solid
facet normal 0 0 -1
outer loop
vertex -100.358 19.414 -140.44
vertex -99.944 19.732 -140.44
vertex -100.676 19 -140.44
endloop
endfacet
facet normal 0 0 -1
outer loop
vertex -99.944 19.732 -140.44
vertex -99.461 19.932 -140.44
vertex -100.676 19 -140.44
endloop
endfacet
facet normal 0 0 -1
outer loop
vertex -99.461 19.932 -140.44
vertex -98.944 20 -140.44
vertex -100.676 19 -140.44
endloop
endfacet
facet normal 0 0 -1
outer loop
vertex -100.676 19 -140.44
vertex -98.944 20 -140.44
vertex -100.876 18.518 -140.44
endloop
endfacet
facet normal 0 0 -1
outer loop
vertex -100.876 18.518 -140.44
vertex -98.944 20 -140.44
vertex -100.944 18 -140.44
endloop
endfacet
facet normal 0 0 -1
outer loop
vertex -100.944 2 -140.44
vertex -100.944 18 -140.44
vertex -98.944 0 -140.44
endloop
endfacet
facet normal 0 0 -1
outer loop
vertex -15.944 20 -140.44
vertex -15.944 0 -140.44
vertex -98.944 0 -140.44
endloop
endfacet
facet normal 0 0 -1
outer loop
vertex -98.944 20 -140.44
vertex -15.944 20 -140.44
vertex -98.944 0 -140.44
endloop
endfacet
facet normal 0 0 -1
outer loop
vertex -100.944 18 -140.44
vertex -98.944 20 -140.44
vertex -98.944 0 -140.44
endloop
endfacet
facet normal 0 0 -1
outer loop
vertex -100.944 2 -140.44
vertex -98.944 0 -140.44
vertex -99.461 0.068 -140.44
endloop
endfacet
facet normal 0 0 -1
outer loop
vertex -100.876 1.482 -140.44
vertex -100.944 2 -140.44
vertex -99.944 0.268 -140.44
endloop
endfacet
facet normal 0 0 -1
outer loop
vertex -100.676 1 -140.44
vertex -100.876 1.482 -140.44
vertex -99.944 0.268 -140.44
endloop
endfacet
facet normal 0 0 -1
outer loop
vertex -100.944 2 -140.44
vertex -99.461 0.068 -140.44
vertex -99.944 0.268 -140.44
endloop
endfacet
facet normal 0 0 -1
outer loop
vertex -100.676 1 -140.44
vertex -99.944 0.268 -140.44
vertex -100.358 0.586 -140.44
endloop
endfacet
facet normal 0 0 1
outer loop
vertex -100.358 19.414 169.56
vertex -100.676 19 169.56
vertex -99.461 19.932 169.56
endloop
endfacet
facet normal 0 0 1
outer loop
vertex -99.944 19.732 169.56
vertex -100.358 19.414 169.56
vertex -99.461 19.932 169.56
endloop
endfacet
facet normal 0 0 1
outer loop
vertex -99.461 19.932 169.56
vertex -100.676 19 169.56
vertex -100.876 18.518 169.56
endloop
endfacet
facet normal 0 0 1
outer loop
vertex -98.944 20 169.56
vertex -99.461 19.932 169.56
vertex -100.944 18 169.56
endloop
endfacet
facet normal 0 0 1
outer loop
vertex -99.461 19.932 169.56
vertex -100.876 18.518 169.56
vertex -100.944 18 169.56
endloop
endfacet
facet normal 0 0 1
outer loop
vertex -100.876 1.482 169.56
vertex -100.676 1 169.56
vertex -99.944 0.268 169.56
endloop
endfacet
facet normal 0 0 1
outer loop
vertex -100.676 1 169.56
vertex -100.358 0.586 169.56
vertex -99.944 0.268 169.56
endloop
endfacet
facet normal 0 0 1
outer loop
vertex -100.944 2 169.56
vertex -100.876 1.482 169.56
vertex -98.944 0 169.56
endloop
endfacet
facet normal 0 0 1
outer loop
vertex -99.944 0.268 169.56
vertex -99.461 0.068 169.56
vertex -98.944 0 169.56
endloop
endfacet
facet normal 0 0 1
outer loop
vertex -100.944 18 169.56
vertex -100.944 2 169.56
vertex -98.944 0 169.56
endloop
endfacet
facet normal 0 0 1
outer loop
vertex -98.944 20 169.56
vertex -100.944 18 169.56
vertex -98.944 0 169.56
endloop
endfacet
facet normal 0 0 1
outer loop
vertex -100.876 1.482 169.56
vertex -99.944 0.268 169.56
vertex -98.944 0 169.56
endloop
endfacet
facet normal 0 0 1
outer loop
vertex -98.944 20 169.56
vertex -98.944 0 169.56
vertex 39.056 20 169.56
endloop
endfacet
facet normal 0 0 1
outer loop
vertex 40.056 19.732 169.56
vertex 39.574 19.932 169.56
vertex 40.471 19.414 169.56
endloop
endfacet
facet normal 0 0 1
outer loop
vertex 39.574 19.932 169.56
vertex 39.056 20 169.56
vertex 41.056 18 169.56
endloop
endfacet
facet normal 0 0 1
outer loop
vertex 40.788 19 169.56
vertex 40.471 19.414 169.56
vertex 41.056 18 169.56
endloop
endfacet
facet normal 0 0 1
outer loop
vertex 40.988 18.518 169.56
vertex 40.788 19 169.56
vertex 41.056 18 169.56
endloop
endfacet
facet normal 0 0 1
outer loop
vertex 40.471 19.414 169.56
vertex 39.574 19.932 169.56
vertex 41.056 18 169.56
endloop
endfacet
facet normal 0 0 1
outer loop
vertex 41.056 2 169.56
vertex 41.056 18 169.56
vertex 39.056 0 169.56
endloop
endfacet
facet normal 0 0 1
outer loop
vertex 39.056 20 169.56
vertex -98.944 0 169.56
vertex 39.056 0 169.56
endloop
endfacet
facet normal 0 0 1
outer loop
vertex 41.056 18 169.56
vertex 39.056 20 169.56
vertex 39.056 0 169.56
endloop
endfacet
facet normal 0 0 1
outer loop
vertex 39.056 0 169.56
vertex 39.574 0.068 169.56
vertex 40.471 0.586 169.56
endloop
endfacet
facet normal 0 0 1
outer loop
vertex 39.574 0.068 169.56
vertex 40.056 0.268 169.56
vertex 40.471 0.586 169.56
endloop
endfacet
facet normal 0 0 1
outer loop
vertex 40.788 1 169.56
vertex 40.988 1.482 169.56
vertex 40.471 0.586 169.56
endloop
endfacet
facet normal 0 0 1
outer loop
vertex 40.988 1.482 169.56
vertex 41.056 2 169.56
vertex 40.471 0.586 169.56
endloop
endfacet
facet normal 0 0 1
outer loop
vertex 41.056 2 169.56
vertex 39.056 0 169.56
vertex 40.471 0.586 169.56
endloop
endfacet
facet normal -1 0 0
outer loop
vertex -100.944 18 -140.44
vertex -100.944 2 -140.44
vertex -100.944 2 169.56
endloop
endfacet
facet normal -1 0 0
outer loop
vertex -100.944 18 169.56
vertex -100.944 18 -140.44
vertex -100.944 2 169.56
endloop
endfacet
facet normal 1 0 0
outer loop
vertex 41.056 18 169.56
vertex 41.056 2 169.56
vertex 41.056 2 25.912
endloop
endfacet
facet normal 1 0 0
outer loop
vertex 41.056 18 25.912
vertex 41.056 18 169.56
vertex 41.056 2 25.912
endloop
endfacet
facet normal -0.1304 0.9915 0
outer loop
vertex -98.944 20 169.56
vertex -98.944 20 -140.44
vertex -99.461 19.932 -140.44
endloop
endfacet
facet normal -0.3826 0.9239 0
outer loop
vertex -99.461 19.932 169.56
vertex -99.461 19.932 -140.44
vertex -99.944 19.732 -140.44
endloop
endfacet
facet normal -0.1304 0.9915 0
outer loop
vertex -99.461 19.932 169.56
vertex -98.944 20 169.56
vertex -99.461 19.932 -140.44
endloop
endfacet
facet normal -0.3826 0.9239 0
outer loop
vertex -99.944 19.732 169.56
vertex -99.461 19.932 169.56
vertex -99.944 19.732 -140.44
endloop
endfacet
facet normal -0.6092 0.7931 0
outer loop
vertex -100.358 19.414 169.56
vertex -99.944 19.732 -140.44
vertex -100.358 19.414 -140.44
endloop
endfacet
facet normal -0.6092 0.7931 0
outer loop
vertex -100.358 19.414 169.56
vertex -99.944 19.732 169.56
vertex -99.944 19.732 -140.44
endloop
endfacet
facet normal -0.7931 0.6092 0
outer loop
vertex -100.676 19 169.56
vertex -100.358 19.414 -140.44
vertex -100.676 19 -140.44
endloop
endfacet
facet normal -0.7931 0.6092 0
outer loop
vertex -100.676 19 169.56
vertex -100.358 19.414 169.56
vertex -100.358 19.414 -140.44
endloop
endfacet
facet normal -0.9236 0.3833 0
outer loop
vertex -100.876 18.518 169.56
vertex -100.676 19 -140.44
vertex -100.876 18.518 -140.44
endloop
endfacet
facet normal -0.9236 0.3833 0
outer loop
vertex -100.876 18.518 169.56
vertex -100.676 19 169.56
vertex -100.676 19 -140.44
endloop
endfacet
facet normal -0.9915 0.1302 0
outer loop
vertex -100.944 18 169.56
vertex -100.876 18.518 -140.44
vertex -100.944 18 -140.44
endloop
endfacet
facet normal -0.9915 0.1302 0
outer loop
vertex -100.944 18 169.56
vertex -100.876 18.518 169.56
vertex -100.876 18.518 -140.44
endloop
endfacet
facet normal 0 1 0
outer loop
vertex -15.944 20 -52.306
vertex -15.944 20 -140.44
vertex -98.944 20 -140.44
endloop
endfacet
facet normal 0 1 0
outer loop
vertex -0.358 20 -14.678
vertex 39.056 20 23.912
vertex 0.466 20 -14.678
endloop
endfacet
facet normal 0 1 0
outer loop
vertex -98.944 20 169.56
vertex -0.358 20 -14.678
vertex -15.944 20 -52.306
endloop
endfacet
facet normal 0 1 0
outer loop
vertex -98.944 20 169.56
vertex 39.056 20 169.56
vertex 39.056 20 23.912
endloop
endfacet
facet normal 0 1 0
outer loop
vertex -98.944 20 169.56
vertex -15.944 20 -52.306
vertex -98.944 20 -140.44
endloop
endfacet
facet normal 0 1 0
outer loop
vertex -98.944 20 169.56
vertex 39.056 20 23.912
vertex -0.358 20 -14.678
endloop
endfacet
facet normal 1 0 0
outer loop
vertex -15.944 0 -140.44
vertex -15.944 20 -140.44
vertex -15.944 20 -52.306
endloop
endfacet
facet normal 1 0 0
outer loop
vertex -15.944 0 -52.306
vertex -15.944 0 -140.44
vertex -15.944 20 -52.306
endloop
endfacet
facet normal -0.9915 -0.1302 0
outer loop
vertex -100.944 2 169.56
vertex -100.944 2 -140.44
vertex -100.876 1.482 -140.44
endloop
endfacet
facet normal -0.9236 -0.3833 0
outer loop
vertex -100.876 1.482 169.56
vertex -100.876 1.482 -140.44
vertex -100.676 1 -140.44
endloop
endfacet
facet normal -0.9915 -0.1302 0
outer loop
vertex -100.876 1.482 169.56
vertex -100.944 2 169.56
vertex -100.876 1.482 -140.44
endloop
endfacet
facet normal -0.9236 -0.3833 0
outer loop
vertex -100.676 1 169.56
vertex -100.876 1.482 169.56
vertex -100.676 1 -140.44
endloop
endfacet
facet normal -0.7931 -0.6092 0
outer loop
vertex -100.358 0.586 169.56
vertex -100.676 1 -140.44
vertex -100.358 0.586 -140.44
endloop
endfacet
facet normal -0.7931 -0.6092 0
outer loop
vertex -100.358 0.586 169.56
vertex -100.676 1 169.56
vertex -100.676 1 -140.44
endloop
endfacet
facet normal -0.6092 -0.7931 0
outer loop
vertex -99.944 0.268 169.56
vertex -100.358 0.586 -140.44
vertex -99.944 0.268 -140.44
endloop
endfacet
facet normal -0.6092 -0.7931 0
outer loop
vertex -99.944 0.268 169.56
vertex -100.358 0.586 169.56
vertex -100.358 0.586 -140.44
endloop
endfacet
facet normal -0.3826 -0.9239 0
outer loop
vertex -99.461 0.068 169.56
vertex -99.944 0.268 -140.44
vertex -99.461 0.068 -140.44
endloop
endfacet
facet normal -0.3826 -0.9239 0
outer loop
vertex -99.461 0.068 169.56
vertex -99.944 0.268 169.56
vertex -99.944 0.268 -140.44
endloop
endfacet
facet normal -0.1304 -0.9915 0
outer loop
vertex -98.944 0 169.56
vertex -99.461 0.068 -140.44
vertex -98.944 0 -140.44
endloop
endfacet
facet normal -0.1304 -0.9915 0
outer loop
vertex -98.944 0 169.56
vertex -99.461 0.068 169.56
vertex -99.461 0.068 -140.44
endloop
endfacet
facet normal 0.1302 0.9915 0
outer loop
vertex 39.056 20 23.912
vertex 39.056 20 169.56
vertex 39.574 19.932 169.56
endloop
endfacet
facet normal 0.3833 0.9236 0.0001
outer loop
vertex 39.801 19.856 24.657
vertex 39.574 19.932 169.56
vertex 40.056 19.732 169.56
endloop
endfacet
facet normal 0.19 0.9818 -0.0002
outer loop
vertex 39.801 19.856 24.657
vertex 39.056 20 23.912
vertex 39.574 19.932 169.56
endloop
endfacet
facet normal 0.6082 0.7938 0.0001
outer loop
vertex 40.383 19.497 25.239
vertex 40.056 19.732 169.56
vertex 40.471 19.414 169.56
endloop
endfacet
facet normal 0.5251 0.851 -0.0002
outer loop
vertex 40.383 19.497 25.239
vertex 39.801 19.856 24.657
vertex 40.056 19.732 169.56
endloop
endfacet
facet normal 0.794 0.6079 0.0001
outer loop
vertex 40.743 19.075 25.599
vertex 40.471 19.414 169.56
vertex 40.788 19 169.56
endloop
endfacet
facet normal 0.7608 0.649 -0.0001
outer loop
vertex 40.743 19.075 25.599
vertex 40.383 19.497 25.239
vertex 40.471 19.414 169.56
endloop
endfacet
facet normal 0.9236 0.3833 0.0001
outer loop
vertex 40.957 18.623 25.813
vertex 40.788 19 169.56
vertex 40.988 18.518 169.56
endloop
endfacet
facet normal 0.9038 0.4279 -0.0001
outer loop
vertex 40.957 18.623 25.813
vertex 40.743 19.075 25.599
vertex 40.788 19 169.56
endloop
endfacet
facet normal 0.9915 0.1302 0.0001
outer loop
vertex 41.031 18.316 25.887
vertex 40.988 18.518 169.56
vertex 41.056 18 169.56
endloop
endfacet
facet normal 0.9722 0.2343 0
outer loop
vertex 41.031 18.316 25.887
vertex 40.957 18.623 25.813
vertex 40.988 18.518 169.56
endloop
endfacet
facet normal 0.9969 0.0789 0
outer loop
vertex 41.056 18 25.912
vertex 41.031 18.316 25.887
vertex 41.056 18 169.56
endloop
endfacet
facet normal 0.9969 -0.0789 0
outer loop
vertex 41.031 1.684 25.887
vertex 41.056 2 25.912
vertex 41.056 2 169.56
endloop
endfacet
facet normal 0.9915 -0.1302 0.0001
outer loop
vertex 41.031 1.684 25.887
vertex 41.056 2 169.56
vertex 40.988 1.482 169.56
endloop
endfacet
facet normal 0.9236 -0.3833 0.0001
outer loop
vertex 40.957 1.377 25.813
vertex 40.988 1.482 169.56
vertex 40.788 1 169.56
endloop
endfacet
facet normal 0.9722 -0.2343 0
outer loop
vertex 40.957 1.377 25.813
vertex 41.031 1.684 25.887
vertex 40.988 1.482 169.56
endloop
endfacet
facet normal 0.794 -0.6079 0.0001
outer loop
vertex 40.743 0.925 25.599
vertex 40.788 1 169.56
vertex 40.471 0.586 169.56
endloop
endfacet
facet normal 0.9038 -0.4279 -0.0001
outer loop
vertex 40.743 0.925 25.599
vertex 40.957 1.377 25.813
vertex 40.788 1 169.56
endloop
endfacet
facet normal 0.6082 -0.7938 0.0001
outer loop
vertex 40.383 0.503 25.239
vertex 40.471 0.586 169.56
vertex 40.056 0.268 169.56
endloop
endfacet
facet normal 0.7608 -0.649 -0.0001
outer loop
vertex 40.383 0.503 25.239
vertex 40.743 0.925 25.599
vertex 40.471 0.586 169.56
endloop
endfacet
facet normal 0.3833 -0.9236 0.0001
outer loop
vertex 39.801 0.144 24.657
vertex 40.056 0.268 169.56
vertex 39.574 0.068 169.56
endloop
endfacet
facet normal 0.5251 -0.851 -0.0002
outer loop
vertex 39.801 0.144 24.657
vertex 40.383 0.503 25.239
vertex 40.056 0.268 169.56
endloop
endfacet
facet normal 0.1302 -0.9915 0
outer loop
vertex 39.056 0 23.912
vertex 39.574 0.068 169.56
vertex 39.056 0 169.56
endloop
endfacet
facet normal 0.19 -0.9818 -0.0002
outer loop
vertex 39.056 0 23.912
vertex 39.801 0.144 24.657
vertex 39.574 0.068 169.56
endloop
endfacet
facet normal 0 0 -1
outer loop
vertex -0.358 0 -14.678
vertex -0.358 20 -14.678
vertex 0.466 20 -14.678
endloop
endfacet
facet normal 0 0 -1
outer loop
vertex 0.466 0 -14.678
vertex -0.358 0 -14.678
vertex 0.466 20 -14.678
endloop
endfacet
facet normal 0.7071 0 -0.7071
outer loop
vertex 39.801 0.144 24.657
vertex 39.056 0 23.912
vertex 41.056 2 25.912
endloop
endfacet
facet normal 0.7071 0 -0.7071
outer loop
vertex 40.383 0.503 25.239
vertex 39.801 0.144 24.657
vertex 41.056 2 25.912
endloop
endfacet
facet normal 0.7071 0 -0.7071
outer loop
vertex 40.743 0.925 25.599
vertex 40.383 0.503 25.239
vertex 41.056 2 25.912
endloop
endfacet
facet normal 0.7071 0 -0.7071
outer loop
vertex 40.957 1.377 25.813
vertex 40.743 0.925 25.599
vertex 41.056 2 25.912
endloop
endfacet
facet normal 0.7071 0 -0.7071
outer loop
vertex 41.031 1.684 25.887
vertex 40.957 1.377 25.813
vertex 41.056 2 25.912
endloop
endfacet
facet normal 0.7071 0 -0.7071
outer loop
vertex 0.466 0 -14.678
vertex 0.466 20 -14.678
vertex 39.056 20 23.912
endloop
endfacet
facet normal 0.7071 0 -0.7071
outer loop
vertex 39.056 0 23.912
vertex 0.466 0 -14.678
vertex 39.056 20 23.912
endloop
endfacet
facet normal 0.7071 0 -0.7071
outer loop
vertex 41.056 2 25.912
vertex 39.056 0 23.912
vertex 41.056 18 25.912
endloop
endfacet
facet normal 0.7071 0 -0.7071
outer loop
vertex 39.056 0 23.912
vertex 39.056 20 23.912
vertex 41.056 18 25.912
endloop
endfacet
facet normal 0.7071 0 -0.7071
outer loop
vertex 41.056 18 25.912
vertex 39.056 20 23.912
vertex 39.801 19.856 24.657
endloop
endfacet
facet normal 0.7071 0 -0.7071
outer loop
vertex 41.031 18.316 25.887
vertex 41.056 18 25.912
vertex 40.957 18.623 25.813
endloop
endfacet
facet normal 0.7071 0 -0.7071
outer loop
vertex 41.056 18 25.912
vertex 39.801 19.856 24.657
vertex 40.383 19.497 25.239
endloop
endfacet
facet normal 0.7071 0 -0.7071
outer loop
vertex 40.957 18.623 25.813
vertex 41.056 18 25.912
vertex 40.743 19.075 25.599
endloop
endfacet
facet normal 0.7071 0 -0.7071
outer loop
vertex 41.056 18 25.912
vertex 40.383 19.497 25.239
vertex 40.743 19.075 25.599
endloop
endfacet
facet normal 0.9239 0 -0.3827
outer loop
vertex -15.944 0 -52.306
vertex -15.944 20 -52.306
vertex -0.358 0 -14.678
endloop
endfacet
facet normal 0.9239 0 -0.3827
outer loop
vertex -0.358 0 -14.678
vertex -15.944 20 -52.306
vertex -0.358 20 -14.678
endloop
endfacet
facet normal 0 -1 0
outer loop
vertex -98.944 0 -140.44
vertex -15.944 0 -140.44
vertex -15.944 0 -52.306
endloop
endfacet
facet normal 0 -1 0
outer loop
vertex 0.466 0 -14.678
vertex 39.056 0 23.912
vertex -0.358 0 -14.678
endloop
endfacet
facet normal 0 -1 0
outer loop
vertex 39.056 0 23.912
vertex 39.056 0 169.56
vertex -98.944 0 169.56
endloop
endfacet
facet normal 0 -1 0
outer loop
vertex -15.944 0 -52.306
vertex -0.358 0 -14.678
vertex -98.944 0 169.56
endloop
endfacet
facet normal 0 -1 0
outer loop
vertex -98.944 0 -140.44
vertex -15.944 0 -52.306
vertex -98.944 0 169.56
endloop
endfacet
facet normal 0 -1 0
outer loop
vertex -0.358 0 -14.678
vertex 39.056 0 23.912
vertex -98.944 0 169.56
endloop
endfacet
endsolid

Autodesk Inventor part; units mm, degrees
ref_plane "YZ Plane" through (0, 0, 0) normal (1, 0, 0) x (0, 1, 0)
ref_plane "XZ Plane" through (0, 0, 0) normal (0, 1, 0) x (-1, 0, 0)
ref_plane "XY Plane" through (0, 0, 0) normal (0, 0, 1) x (1, 0, 0)
sketch "Skizze1" plane through (0, 0, 0) normal (0, 1, 0) x (-1, 0, 0)
  line L0 (100.9437, 169.5604) -> (-41.0563, 169.5604)
  line L1 (-41.0563, 169.5604) -> (-41.0563, -140.4396)
  line L2 (-41.0563, -140.4396) -> (100.9437, -140.4396)
  line L3 (100.9437, -140.4396) -> (100.9437, 169.5604)
  point P0 (0, 0)
  dimension "d0" = 142
  dimension "d1" = 310
extrude "Extrusion1" add sketch "Skizze1" along normal blind 20
sketch "Skizze3" plane through (0, 20, 0) normal (0, 1, 0) x (1, 0, 0)
  line L0 (41.0563, -169.5604) -> (41.0563, 140.4396) projected
  line L1 (-100.9437, -169.5604) -> (41.0563, -169.5604) projected
  line L2 (41.0563, 140.4396) -> (-15.9437, 140.4396)
  line L3 (-15.9437, 140.4396) -> (-15.9437, -169.5604)
  line L4 (-15.9437, -169.5604) -> (41.0563, -169.5604)
  line L5 (41.0563, -169.5604) -> (41.0563, 140.4396)
  line L6 (-100.9437, 140.4396) -> (-100.9437, -169.5604) projected
  line L7 (-55.1017, 146.8416) -> (-0.3577, 14.6778)
  line L8 (0.4663, 14.6778) -> (101.62, -86.4759)
  line L9 (-0.3577, 14.6778) -> (0.4663, 14.6778)
  point P0 (0, 0)
  point P1 (-15.9437, 52.3058)
  point P2 (41.0563, -25.9122)
  dimension "d66" = 85
  dimension "d69" = 157.5
  dimension "d70" = 316.402
  dimension "d71" = 45.842
  dimension "d72" = 143.053
  dimension "d74" = 143.053
  dimension "d75" = 157.5
  dimension "d76" = 0
  dimension "d77" = 0.824
extrude "Extrusion4" cut sketch "Skizze3" against normal through all contours L8 L9 L7 L3 L2 L0
fillet "Rundung1" radius 2 4 edges at (-100.9437, 20, 14.5604) (-100.9437, 0, 14.5604) (41.0563, 20, 97.7363) (41.0563, 0, 97.7363)
properties part number "VerstaerkungHintenLinks"
